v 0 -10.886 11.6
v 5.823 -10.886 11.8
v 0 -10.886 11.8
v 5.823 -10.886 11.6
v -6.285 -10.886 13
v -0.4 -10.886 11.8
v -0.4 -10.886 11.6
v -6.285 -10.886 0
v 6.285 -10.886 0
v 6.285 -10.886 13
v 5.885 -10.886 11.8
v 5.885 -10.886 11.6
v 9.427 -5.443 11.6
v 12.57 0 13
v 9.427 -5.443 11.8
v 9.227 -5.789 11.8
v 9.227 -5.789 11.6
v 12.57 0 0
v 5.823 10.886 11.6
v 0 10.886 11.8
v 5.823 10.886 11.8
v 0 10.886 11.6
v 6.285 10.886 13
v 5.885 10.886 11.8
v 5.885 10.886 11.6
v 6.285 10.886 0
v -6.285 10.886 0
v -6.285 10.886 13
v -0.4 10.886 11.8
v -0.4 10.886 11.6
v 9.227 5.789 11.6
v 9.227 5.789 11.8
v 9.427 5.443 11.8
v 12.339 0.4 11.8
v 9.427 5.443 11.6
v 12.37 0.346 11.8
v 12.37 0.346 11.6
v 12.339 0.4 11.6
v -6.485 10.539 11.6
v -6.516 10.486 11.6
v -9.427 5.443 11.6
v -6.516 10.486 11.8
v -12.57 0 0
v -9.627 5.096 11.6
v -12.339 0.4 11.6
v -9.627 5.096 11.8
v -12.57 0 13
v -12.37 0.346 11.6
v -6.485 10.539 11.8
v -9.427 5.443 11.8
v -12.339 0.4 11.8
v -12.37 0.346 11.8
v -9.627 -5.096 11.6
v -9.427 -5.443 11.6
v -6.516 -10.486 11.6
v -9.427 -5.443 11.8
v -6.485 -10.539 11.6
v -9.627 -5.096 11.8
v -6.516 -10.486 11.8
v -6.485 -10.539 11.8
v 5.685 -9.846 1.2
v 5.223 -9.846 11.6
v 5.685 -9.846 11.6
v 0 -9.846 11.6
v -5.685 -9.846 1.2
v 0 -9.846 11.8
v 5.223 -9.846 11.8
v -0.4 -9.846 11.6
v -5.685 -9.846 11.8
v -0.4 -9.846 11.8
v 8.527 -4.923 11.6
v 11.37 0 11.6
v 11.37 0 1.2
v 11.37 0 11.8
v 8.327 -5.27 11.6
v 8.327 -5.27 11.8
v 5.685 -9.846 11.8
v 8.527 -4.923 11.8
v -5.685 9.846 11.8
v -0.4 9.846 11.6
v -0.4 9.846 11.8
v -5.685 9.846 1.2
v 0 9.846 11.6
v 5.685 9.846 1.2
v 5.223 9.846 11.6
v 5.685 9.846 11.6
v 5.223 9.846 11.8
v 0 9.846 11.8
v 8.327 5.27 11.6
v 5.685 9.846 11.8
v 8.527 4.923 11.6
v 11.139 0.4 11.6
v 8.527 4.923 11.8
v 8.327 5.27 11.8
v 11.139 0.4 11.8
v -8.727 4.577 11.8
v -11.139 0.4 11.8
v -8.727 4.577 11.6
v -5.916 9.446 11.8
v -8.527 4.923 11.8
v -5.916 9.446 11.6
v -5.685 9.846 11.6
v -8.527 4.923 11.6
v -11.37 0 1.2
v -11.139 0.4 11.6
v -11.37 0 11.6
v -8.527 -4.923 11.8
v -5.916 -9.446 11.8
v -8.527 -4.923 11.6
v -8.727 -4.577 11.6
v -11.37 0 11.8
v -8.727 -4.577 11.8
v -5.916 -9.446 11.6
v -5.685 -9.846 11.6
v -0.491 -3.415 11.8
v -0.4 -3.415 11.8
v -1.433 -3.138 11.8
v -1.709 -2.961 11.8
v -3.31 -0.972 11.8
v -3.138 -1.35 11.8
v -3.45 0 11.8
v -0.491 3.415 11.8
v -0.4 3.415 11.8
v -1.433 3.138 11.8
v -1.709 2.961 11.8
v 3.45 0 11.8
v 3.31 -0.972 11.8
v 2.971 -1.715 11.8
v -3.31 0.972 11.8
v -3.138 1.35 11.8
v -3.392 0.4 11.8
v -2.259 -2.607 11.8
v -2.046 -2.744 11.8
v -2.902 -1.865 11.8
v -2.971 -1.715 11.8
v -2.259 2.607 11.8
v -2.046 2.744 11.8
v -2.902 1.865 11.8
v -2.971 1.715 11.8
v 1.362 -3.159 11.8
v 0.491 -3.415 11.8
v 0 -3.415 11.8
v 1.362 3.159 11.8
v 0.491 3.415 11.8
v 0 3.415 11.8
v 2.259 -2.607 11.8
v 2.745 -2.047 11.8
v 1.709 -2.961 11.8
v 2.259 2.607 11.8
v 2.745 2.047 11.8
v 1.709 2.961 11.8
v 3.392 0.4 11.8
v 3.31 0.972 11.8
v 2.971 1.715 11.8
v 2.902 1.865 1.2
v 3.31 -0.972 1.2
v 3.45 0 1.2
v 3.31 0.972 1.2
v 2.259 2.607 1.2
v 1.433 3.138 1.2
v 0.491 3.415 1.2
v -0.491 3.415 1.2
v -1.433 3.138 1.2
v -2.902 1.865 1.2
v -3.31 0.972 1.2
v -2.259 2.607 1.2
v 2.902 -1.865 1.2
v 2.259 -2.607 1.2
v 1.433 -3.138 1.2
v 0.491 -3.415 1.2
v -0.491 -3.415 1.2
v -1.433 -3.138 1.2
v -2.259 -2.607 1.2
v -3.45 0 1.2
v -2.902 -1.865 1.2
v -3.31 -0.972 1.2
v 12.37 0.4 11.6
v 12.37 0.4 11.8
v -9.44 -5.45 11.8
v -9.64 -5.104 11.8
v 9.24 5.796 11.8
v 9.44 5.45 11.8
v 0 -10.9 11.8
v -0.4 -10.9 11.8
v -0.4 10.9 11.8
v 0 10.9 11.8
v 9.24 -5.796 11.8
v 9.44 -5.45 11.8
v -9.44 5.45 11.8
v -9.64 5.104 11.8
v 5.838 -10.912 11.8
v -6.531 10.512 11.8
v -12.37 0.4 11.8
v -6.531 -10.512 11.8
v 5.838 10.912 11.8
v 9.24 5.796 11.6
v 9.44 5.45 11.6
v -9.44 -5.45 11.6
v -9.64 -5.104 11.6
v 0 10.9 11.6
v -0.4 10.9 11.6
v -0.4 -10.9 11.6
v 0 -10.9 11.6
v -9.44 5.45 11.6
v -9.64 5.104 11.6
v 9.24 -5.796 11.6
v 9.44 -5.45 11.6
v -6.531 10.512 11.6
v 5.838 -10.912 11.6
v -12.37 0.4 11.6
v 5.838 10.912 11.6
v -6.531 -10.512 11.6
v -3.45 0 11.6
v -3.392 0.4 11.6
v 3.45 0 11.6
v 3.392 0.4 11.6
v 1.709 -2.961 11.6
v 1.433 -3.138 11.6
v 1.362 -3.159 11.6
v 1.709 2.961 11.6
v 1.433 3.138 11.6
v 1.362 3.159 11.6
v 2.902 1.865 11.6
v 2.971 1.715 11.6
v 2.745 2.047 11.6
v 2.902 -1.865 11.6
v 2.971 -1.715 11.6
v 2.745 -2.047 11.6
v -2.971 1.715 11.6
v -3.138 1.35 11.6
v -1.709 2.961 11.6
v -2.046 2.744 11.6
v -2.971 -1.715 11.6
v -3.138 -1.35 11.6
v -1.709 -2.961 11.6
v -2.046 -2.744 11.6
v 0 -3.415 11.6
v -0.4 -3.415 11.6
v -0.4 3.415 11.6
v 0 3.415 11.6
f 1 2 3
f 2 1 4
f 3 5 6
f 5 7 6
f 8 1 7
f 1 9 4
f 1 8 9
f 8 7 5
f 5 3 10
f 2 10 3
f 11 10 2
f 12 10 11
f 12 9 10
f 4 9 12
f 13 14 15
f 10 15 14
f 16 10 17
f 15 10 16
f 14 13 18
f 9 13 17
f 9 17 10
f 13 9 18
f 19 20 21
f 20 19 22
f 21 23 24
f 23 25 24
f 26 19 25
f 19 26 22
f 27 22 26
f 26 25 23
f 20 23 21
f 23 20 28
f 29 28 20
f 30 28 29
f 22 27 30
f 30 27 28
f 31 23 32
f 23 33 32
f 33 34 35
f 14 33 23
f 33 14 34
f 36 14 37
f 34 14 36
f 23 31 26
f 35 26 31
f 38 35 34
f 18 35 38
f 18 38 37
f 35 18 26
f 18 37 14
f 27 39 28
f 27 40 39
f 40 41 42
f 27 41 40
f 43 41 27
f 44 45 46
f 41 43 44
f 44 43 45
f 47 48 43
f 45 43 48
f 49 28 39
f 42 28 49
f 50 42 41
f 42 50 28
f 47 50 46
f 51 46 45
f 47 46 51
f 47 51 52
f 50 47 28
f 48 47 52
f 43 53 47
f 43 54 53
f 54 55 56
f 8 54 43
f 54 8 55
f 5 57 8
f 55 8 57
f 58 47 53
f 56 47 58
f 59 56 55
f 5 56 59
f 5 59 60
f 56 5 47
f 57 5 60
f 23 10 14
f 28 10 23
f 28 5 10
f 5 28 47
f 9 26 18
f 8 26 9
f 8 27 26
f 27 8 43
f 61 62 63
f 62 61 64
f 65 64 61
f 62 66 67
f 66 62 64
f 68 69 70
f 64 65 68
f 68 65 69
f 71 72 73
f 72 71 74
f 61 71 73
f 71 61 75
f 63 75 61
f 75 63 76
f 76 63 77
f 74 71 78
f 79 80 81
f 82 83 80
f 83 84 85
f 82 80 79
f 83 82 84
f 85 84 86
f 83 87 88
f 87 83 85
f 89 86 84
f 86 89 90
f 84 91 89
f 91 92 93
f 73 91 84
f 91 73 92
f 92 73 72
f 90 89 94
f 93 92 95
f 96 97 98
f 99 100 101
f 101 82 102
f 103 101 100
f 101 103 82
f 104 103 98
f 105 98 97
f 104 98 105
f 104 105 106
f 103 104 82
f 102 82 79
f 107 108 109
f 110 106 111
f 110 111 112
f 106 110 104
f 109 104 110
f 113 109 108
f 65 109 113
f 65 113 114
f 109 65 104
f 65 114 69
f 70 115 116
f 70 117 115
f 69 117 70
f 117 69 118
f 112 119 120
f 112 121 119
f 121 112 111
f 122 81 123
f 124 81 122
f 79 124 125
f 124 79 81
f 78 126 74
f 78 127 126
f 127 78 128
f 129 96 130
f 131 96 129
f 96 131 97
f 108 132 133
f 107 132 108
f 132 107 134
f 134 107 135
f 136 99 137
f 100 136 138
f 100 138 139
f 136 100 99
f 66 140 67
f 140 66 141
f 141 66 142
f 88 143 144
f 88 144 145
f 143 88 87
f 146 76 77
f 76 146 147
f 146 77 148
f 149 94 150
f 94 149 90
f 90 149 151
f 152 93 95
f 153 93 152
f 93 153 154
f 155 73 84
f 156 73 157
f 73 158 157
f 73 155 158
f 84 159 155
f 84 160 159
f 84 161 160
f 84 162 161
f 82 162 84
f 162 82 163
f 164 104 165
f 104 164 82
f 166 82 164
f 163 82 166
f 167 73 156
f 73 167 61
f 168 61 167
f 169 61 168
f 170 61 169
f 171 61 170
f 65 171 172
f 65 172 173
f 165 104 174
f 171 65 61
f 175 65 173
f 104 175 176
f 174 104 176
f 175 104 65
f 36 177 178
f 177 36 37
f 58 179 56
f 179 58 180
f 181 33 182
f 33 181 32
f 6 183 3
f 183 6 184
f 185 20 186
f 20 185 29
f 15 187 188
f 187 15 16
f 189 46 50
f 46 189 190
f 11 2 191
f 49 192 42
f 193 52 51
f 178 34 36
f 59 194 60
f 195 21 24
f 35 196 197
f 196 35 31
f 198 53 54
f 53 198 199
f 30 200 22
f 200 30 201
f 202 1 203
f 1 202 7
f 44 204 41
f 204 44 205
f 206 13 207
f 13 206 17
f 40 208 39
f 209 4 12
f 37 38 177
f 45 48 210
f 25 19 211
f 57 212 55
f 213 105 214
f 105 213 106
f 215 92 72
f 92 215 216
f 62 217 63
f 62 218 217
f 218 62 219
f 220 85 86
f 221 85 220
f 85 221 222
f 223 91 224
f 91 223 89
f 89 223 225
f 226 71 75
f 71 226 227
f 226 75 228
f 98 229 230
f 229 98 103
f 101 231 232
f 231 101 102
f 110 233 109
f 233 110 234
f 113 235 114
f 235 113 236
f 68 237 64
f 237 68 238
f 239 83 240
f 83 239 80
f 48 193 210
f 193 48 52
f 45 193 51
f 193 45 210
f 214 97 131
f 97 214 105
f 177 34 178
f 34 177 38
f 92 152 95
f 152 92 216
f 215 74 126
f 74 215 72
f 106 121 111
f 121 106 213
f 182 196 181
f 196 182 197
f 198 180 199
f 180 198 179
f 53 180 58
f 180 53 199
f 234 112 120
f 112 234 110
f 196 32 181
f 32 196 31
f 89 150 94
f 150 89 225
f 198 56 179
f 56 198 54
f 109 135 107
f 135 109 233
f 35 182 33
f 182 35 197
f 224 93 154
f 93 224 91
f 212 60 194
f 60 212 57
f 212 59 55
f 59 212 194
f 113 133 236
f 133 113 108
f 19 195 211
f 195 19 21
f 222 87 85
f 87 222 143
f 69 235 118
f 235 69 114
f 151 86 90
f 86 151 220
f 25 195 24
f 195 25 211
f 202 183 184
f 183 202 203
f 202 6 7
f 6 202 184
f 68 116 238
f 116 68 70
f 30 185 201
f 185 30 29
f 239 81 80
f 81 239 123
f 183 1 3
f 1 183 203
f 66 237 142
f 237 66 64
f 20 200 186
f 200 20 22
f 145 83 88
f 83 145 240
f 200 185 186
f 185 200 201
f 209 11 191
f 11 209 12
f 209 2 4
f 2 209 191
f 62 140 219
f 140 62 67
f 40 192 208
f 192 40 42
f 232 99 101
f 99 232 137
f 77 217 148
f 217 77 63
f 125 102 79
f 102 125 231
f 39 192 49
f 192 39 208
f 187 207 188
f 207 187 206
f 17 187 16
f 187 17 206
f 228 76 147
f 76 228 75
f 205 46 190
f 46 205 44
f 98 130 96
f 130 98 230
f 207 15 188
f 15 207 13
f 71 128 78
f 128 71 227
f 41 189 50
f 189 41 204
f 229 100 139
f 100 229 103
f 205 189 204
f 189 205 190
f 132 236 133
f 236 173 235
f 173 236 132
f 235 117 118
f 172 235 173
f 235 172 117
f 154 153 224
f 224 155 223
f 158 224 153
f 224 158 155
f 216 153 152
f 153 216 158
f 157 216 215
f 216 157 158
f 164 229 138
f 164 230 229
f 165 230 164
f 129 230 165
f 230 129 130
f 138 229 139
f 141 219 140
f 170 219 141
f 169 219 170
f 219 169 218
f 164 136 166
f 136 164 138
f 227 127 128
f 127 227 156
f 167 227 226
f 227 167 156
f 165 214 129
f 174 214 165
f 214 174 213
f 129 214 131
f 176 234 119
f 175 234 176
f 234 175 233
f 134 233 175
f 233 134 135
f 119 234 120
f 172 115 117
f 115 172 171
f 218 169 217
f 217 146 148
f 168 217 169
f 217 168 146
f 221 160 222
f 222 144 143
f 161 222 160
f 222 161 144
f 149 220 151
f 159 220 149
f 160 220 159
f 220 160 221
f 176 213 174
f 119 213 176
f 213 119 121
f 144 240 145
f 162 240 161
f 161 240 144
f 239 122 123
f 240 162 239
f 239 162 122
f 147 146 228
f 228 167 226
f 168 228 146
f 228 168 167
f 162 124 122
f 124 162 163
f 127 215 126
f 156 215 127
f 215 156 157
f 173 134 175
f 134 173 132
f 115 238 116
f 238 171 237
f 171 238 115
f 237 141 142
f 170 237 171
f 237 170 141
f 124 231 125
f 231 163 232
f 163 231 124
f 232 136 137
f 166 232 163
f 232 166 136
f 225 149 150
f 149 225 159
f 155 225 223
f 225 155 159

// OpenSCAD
// -*- mode: SCAD ; c-file-style: "ellemtel" ; coding: utf-8 -*-
//
// A klepsydra of the sinking type
// Uses 18 5 Eurocent coins as weight.
//
// © 2018 Roland Sieker <ospalh@gmail.com>
// Licence: CC-BY-SA 4.0


// Set this to “render” and click on “Create Thing” when done with the setup.
preview = true; // [false:render, true:preview]

// Size of the balast nuts, per DIN. Standard: M12
S = 19;
m = 10;
d_1 = 10.1;

d_nozzle = 1;

h = 50;  // Height of bowl
r_t = 70; // Radius at top of bowl


/* [Hidden] */

// Done with the customizer

// *******************************************************
// Extra parameters. These can be changed reasonably safely.


w = 1.2;  // Wall width
p = 1.2;  // Bottom, top plate height
cs = 0.4;  // Clearance (horizontal)
cs_v = 0.2; // Vertical clearance
angle = 60; // Overhangs much below 60° are a problem for me
lh = 0.2;  // Layer height
nw = 0.4;  // Nozzle width

// *******************************************************
// Some shortcuts. These shouldn’t be changed

tau = 2 * PI;  // π is still wrong. τ = ⌀ ÷ r

e_2 = S / sqrt(3);
e = S * 2 / sqrt(3);

r_2 = S/2;
r_1 = d_1/2;

xy_factor = 1/tan(angle);
// To get from a height to a horizontal width inclined correctly
z_factor = tan(angle);  // The other way around


some_distance = 50;
ms = 0.01;  // Muggeseggele.

// fn for differently sized objects and fs, fa; all for preview or rendering.
pna = 40;
pnb = 15;
pa = 5;
ps = 1;
rna = 180;
rnb = 30;
ra = 1;
rs = 0.1;
function na() = (preview) ? pna : rna;
function nb() = (preview) ? pnb : rnb;
$fs = (preview) ? ps : rs;
$fa = (preview) ? pa : ra;

// *******************************************************
// End setup



// *******************************************************
// Generate the parts

scuttle_klepsydra();

// *******************************************************
// Code for the parts themselves


module scuttle_klepsydra()
{
   one_nut();

}

module bottom_plate()
{
   linear_extrude(p)
   {

   }
}

module one_nut()
{
   difference()
   {
      one_solid_nut();
      one_nut_space();

   }
   nut_core();
   nut_helper();
}

module one_solid_nut()
{
   cylinder(r=e_2+w+cs, h=m+2*p+2*cs_v+lh, $fn=6);
}

module 2d_outer_nut()
{
   circle(r=e_2+w+cs, $fn=6);
}

module one_nut_space()
{
   translate([0,0,p])
   {
      cylinder(r=e_2+cs, h=m+2*cs_v+lh, $fn=6);
   }
}

module nut_core()
{
   cylinder(r=r_1-cs-w, h=m+2*p+2*cs_v);
}

module nut_helper()
{
   translate([0,0,m+2*cs_v+p])
   {
      for (a=[0:60:179])
      {
         b = a+30;
         echo(a,b);
         rotate(a)
         {
            translate([0,nw/2,lh/2])
            {
               cube([e+2*w+cs,nw,lh],center=true);
            }
         }
         rotate(b)
         {
            translate([0,nw/2,lh/2])
            {
               cube([S+2*w+cs,nw,lh],center=true);
            }
         }
      }
   }
}
